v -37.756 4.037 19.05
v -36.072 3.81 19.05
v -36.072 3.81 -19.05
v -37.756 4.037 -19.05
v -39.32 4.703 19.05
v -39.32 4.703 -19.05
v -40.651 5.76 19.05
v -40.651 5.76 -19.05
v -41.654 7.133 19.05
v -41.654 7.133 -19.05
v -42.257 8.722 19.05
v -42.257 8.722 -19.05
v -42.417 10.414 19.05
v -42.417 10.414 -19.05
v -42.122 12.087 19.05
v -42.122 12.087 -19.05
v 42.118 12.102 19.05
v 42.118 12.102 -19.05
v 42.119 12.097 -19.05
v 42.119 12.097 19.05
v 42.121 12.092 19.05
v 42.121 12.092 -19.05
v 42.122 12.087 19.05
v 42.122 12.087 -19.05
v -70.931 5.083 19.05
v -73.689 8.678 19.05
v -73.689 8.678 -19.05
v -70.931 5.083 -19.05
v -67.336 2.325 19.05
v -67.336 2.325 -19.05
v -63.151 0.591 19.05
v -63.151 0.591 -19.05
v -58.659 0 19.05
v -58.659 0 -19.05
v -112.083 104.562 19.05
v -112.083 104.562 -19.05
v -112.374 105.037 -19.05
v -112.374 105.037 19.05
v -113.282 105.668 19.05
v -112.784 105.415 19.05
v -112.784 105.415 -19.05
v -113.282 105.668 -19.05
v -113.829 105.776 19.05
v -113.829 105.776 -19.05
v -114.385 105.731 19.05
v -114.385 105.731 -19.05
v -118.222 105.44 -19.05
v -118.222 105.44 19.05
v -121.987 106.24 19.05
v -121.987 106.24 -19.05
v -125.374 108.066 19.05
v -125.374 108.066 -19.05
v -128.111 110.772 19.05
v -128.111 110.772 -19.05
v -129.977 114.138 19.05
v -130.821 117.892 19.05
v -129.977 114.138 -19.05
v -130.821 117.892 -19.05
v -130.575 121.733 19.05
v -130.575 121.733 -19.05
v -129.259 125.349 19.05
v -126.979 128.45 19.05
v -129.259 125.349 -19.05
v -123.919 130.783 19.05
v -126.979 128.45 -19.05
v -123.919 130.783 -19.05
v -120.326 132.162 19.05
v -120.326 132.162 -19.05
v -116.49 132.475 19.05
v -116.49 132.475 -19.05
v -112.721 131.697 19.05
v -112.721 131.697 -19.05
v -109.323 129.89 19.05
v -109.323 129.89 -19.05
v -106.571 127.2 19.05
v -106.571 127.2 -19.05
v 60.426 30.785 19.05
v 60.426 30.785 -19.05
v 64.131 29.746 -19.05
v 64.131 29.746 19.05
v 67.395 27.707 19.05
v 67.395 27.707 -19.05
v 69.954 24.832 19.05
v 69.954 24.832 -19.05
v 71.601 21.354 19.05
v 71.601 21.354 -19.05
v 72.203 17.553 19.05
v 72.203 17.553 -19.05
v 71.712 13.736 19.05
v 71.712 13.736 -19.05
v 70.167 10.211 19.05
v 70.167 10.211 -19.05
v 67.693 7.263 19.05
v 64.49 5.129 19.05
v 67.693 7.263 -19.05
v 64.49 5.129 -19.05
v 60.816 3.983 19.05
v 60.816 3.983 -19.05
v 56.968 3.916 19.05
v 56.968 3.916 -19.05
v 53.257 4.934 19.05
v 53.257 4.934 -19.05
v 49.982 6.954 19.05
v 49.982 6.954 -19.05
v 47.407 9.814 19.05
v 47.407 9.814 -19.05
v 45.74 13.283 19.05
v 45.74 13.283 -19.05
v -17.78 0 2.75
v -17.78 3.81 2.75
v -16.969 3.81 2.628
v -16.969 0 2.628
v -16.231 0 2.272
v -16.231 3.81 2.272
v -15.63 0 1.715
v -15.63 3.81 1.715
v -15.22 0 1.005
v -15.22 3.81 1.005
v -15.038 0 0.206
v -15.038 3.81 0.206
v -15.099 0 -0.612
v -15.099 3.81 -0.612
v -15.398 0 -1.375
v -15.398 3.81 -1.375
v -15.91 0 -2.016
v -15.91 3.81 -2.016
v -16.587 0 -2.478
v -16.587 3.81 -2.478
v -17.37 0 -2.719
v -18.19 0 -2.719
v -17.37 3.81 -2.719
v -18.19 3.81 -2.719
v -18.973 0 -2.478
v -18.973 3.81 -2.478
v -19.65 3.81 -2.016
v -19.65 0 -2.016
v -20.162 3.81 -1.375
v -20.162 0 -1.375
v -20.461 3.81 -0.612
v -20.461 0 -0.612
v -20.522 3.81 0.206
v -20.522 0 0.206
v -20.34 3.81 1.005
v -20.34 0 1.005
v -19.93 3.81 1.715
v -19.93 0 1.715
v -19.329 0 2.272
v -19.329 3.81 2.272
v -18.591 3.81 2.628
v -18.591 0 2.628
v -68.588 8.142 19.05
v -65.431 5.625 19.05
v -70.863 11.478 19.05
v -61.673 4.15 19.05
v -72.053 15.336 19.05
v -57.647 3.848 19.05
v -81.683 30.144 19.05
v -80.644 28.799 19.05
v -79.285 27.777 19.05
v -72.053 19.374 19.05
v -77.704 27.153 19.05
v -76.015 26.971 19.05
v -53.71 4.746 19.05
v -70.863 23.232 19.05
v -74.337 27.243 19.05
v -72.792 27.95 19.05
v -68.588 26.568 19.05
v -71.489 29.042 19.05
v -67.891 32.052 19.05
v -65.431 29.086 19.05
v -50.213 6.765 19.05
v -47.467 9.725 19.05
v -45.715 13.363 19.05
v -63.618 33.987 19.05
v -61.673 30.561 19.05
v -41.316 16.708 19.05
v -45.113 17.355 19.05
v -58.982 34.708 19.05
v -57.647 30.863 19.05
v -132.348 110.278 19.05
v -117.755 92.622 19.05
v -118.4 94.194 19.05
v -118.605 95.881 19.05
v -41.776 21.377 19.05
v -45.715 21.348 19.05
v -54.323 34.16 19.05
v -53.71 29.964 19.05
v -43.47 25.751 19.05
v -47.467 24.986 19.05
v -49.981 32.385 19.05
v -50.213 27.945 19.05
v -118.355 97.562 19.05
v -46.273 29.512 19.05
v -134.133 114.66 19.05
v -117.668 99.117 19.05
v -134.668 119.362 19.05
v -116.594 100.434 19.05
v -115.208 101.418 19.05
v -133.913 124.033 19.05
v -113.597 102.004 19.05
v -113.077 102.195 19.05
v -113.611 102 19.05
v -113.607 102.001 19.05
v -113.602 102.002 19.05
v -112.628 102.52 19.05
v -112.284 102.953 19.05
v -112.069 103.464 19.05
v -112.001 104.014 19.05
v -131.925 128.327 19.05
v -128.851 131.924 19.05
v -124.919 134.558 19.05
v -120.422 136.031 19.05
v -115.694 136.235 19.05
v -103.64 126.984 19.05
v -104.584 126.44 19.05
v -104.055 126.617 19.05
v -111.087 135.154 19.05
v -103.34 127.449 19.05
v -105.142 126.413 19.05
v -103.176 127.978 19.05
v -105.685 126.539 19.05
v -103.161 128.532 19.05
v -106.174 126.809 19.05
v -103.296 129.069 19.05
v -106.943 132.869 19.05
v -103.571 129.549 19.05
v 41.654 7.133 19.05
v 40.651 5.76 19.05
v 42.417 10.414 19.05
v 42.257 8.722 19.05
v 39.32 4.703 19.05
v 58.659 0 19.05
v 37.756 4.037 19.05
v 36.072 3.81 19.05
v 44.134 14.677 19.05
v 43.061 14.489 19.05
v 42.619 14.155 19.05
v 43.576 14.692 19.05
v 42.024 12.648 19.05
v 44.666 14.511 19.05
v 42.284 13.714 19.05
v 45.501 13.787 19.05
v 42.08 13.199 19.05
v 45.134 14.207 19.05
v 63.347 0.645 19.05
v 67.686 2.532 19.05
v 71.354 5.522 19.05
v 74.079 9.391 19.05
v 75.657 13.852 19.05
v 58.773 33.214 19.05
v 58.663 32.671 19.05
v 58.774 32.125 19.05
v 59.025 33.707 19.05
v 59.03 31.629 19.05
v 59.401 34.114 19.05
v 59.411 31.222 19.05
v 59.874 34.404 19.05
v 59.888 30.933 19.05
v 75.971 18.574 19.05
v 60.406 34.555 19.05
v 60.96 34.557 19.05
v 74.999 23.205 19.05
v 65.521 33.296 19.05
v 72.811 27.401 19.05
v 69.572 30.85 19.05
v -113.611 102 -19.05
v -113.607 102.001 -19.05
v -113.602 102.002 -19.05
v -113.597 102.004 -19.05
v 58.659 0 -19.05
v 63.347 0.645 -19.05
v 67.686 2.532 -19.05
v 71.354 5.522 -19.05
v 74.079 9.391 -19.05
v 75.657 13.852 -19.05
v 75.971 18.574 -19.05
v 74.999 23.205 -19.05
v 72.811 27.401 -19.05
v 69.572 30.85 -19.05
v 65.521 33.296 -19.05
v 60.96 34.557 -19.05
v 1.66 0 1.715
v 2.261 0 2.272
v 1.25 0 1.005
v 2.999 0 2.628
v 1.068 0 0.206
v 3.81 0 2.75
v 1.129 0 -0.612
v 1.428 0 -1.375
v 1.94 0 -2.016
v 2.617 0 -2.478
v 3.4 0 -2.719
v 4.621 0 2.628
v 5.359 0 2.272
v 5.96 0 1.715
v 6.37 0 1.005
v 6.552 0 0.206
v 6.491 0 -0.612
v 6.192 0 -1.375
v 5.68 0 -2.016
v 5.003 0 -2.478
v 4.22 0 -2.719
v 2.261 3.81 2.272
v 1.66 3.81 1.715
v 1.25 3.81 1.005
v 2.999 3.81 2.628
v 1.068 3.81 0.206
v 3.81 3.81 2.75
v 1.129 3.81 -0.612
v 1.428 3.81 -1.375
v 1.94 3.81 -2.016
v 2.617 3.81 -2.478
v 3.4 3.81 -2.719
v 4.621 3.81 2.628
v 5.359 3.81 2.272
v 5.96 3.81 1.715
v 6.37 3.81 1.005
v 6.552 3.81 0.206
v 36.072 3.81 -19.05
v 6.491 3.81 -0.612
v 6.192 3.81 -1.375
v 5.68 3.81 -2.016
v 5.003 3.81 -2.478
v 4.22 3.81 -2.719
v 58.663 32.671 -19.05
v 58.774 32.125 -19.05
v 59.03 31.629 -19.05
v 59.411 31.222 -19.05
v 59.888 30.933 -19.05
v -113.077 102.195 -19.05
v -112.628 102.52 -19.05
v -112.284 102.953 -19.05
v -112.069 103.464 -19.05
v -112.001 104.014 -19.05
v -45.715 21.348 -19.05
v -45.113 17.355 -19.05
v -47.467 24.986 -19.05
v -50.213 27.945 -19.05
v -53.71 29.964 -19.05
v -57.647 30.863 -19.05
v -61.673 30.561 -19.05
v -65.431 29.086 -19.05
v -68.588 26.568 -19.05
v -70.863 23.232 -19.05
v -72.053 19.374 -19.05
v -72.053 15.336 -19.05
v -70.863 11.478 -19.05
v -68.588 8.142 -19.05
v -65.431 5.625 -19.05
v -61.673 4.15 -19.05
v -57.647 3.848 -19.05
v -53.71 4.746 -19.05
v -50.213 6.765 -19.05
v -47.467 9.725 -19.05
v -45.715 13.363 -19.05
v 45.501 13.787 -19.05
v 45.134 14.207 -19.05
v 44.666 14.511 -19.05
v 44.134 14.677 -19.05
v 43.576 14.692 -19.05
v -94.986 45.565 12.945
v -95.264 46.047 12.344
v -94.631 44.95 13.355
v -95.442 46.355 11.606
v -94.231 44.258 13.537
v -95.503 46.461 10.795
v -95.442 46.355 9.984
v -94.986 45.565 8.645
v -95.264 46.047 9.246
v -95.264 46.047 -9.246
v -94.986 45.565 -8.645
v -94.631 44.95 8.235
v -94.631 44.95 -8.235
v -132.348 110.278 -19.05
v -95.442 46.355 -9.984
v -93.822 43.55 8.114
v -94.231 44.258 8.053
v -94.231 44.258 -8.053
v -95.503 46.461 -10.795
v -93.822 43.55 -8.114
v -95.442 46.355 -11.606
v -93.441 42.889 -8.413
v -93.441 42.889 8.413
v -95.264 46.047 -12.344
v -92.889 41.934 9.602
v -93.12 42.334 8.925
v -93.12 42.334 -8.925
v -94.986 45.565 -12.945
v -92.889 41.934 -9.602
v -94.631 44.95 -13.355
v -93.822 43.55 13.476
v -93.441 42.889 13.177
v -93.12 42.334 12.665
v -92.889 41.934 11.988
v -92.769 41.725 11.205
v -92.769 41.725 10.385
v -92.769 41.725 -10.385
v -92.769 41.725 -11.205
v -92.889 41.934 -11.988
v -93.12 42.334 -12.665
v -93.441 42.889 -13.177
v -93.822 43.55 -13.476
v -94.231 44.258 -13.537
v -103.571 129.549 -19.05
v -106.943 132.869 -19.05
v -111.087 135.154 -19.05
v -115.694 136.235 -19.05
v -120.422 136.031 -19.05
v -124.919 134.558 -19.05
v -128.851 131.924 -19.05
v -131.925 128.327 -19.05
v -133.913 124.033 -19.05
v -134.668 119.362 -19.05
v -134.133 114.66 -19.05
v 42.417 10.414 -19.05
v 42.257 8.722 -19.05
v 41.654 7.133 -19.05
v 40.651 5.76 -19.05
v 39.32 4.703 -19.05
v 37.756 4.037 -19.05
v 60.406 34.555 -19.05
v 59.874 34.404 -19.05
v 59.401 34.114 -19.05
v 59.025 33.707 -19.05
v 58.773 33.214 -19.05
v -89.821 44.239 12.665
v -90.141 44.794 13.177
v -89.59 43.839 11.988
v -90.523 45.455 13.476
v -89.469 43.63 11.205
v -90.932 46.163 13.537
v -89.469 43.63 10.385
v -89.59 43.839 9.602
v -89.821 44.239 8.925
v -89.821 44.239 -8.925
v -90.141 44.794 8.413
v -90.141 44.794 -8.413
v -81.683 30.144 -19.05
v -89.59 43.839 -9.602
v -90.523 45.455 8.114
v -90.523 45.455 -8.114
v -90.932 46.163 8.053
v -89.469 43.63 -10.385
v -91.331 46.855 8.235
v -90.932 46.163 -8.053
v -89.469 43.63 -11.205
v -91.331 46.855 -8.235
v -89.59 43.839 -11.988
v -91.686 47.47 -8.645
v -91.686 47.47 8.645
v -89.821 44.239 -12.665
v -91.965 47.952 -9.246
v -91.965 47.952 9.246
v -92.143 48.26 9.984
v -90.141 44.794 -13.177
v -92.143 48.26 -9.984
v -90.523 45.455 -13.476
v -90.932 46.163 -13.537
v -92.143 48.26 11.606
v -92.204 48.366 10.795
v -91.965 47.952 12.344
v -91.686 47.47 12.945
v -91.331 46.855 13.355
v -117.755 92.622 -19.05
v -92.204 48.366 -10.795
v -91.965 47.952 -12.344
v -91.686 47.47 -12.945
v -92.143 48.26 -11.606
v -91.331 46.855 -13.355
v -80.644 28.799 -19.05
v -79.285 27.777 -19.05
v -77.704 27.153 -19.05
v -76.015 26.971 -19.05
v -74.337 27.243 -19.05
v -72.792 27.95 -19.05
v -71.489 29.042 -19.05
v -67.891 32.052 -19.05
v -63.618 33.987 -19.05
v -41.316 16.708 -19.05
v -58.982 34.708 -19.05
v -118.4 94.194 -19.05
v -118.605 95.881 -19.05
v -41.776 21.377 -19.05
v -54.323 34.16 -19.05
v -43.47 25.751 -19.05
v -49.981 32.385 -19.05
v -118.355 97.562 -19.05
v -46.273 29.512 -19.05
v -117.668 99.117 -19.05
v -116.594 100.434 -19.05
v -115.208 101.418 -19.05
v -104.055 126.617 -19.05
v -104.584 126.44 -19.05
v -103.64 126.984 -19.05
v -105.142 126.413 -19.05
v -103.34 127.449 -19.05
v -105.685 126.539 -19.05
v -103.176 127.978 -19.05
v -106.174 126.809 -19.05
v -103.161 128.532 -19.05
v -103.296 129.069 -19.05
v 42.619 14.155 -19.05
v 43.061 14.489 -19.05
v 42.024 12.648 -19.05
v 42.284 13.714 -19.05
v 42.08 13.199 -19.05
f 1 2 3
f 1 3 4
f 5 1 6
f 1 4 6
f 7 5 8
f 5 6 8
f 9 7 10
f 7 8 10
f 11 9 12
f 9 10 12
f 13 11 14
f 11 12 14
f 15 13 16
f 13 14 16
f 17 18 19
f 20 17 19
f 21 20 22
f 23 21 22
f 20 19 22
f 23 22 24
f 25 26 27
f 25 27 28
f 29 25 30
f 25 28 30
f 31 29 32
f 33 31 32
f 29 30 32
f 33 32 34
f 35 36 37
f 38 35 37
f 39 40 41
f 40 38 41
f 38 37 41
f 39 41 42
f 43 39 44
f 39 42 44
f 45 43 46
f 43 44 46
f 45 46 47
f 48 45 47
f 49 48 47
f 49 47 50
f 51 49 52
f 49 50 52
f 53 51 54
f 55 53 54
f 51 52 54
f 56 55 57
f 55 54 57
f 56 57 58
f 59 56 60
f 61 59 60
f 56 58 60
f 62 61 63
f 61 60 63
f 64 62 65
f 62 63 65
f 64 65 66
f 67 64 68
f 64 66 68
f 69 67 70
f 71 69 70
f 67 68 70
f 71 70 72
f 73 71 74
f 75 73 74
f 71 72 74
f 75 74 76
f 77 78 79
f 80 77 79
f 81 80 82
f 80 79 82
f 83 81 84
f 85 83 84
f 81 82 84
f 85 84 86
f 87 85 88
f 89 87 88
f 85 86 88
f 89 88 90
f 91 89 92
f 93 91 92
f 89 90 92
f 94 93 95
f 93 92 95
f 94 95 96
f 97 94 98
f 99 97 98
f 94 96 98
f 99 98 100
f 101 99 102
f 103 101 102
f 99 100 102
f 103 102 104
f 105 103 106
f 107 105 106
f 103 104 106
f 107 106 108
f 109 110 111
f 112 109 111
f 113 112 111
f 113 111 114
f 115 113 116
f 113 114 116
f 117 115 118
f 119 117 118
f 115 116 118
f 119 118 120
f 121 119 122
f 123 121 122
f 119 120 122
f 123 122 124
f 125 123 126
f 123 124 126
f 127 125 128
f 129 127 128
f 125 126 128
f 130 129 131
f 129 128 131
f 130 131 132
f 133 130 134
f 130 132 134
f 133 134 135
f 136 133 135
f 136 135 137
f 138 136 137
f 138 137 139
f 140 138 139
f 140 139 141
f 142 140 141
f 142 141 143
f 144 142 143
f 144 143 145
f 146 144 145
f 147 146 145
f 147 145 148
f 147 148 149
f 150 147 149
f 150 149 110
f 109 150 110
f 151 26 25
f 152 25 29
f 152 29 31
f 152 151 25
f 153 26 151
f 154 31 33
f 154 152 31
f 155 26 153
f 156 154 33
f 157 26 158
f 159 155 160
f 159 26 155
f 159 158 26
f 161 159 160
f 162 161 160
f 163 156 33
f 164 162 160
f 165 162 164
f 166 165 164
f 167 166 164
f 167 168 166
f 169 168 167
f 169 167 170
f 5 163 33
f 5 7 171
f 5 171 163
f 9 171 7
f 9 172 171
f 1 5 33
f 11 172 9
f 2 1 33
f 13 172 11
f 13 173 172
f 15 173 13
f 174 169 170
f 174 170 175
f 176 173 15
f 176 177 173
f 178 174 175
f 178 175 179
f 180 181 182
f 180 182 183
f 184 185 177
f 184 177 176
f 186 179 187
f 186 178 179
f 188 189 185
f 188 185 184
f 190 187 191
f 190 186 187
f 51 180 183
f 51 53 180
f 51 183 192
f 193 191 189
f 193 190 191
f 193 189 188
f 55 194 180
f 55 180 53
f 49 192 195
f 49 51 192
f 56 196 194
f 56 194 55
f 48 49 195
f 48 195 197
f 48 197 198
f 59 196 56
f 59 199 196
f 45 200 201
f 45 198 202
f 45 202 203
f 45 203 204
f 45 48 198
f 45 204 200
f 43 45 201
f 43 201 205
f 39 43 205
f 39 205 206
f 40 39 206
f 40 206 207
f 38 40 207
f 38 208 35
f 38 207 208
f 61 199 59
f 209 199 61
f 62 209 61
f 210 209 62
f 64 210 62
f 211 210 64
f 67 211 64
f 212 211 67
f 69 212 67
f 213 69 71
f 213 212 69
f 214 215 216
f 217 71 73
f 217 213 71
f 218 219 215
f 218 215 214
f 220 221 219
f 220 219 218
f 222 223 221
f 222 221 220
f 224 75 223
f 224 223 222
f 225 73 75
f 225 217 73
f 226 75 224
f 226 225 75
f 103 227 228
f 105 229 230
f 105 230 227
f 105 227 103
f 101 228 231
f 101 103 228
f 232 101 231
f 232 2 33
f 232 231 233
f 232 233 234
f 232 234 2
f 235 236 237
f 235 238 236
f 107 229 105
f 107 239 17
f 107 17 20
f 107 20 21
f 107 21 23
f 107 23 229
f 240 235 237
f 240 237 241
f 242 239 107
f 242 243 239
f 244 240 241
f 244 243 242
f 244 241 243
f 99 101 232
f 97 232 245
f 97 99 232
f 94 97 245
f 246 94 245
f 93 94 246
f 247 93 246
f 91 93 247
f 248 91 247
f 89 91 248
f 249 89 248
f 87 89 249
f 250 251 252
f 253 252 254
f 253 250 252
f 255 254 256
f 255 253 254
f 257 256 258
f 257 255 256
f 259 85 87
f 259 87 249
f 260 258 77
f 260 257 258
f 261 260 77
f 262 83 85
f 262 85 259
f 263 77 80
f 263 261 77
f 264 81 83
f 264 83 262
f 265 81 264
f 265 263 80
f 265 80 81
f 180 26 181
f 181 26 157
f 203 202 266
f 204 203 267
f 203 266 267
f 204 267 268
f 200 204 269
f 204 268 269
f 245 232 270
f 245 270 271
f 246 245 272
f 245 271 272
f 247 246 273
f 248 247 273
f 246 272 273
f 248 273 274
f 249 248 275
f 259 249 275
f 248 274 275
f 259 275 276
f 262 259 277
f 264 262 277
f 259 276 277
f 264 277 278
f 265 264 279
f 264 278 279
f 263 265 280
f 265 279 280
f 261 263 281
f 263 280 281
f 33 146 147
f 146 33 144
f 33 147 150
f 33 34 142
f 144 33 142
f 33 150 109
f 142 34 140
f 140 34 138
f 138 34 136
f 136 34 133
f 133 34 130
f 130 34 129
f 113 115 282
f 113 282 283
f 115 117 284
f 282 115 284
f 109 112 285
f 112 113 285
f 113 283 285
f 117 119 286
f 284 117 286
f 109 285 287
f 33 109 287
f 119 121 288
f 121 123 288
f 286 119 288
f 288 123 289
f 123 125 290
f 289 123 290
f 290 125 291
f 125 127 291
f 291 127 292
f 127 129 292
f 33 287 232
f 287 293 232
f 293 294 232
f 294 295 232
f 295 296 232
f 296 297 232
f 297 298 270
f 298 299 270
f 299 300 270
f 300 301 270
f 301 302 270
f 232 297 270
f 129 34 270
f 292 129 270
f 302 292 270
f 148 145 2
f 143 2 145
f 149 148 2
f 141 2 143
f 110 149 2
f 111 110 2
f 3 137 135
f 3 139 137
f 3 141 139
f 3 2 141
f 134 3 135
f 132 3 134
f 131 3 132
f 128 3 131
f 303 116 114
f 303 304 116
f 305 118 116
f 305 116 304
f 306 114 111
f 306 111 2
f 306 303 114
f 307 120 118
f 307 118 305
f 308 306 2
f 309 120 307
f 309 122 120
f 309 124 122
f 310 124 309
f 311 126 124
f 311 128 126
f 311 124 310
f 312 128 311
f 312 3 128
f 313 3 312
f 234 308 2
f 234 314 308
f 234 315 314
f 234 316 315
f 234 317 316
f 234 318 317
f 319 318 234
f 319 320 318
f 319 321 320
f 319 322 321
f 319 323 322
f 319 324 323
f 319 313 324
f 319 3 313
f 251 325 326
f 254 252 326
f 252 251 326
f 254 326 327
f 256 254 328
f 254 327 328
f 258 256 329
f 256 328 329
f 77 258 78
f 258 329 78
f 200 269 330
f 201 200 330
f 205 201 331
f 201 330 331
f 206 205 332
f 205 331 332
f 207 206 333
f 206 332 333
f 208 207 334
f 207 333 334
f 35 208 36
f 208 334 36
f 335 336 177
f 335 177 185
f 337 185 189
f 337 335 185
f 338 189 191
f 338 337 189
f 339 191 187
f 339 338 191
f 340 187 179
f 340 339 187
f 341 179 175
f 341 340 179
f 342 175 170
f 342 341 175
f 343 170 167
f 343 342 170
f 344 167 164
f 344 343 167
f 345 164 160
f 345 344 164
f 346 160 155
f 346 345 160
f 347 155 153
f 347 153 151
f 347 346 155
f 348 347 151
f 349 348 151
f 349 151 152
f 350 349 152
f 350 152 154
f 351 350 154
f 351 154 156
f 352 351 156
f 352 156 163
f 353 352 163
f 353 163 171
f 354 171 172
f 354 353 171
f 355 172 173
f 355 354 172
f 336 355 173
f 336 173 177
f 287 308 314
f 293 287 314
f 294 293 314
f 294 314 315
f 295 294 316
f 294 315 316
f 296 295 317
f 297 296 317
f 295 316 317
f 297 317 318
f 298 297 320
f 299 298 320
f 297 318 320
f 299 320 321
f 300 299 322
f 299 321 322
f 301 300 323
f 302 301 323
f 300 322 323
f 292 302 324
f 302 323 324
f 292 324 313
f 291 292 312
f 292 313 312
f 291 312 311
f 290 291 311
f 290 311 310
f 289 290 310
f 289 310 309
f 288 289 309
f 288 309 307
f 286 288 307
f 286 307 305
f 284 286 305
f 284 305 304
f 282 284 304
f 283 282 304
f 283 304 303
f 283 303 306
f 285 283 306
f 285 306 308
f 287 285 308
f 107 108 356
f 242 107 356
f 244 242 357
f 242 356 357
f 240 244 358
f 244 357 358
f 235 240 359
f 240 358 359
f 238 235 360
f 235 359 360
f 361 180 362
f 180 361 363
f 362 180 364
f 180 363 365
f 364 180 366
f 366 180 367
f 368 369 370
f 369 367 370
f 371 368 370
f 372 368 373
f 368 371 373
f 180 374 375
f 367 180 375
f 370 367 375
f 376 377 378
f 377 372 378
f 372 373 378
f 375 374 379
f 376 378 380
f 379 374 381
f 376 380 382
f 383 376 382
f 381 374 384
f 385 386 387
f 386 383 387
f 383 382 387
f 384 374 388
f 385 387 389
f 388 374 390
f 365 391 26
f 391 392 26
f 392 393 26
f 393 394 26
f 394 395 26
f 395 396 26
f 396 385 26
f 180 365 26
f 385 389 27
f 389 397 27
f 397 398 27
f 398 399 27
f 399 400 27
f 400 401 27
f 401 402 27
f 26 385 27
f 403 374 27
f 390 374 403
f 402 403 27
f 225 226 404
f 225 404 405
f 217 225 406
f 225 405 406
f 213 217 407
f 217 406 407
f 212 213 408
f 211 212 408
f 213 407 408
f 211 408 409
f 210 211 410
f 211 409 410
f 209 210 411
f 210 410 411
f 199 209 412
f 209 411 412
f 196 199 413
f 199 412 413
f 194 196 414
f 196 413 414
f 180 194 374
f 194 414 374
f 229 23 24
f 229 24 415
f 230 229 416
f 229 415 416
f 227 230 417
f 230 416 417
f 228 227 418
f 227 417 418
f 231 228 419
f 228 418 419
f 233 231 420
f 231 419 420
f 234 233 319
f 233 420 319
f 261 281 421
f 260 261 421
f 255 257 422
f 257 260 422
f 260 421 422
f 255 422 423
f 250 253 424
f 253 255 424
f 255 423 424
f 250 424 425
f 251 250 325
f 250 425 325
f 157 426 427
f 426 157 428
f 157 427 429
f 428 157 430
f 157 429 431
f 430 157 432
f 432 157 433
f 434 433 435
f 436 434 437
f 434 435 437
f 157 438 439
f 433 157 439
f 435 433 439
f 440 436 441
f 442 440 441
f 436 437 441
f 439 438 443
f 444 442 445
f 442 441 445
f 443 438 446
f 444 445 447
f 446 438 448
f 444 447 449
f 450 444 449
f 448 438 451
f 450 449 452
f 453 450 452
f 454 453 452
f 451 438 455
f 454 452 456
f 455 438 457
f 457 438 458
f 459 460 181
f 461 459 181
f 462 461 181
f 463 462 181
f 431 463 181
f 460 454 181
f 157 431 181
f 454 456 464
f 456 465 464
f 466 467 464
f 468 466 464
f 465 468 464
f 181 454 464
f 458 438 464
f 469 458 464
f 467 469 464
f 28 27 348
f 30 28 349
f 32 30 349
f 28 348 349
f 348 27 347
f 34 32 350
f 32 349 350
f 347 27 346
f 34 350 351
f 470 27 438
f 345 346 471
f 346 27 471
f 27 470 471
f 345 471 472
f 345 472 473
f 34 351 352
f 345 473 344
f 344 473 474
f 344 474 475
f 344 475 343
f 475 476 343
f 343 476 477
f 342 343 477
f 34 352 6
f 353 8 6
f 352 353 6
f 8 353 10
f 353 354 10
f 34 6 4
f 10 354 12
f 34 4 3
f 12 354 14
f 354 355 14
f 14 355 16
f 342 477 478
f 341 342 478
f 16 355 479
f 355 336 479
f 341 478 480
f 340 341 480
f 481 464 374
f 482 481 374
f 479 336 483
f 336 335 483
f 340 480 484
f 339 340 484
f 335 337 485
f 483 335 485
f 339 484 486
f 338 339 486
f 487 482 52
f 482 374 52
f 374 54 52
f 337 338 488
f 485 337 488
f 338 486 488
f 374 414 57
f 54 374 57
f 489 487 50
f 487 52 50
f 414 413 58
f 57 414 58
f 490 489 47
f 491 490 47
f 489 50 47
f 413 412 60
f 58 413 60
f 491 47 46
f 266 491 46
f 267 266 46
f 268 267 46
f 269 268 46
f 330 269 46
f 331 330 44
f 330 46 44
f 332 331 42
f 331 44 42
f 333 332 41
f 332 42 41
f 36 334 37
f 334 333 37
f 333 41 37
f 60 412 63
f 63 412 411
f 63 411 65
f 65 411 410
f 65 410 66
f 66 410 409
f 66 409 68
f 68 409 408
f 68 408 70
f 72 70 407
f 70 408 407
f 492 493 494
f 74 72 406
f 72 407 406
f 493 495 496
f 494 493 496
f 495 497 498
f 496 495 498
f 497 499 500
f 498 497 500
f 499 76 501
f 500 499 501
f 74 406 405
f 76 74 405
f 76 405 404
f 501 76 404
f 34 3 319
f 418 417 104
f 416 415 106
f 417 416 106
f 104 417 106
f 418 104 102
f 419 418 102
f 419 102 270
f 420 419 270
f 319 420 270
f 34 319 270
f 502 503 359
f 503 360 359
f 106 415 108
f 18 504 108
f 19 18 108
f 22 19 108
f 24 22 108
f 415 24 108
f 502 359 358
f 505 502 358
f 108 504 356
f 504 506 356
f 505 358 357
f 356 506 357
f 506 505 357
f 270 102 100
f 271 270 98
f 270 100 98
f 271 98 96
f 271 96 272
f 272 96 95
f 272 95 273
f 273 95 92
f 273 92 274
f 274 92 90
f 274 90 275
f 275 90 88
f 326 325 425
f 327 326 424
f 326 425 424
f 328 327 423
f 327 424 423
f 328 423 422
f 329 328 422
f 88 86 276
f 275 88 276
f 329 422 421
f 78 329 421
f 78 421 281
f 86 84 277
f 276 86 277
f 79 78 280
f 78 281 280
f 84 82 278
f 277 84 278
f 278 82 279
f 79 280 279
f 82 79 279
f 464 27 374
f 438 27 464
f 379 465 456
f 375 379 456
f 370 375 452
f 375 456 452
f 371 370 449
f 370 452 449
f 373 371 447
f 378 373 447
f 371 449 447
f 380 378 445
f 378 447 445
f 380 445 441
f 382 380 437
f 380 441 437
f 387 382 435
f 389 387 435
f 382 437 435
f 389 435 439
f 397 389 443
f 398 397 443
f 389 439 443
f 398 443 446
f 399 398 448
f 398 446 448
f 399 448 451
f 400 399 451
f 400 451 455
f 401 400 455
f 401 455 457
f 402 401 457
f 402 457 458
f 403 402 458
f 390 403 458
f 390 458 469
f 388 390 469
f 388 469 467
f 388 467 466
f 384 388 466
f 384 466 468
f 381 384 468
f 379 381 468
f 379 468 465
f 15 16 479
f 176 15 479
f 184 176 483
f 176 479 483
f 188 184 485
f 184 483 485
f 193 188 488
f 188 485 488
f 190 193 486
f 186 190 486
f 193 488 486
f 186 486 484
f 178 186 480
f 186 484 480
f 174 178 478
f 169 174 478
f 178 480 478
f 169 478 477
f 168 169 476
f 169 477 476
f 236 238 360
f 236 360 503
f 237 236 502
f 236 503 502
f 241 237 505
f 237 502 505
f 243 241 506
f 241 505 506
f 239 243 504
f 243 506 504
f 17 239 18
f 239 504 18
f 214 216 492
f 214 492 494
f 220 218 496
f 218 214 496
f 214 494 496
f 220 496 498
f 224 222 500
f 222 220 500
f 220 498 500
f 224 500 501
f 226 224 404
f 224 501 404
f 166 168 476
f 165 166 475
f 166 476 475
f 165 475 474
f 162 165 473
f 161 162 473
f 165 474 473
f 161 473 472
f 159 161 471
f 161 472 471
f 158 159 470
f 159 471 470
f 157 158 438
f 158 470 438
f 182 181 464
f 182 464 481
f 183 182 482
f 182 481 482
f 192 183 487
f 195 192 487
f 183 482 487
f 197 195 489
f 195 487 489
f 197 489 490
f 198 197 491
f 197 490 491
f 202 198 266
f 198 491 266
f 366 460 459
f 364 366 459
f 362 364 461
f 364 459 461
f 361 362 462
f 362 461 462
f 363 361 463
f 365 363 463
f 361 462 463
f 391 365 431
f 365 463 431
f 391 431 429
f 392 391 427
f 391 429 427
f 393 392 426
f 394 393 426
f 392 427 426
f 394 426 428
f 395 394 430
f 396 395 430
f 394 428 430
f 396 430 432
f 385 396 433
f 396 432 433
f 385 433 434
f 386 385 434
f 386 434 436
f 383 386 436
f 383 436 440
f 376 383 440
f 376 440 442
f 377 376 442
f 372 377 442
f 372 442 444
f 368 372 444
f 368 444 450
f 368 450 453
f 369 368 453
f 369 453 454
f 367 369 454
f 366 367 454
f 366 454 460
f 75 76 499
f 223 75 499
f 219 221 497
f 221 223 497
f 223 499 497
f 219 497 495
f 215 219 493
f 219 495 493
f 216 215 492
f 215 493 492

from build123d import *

# Parameters (mm, degrees)
SKETCH3_W               = 114.3
SKETCH3_H               = 38.1
BOSS_EXTRUDE1_DEPTH     = 3.81
BOSS_EXTRUDE2_START     = -19.05
BOSS_EXTRUDE2_OUTLINE_R = 13.5453125
BOSS_EXTRUDE2_DEPTH     = 38.1
FILLET1_R               = 2.032
SKETCH5_R               = 2.749999961
CUT_EXTRUDE4_DEPTH      = 12.7
SKETCH6_R               = 2.749999961
CUT_EXTRUDE5_DEPTH      = 7.62


# Read off the part's stored shape, not the designer's step: Boss-Extrude2
with BuildPart() as part:
    # Sketch3 → Boss-Extrude1 (new body)
    with BuildSketch(Plane(origin=(0, 0, 0), x_dir=(1, 0, 0), z_dir=(0, 1, 0))):
        Rectangle(SKETCH3_W, SKETCH3_H)
    extrude(amount=BOSS_EXTRUDE1_DEPTH)

    # Boss-Extrude2 outline → Boss-Extrude2 (add)
    # profile 1 of 2: a face of its own
    with BuildSketch(Plane.XY.offset(BOSS_EXTRUDE2_START)):
        with BuildLine():
            ThreePointArc((58.658787305, 0), (76.014099805, 17.3553125), (58.658787305, 34.710625))
            Line((58.658787305, 34.710625), (58.658787305, 30.900625))
            ThreePointArc((58.658787305, 30.900625), (69.035098676, 8.648553456), (45.319258538, 15.003193668))
            Line((45.319258538, 15.003193668), (41.567140999, 14.341594112))
            ThreePointArc((41.567140999, 14.341594112), (41.806974837, 13.2052175), (42.122274879, 12.087425946))
            ThreePointArc((42.122274879, 12.087425946), (41.198342199, 6.412778013), (36.071859255, 3.81))
            Line((36.071859255, 3.81), (57.15, 3.81))
            Line((57.15, 3.81), (57.15, 0))
            Line((57.15, 0), (58.658787305, 0))
        make_face()
    # profile 2 of 2: a face of its own
    with BuildSketch(Plane.XY.offset(BOSS_EXTRUDE2_START)):
        with BuildLine():
            Line((-58.658787305, 0), (-57.15, 0))
            Line((-57.15, 0), (-57.15, 3.81))
            Line((-57.15, 3.81), (-36.071859255, 3.81))
            ThreePointArc((-36.071859255, 3.81), (-41.198342199, 6.412778013), (-42.122274879, 12.087425946))
            ThreePointArc((-42.122274879, 12.087425946), (-49.981131055, 32.385454016), (-71.489167098, 29.042409074))
            ThreePointArc((-71.489167098, 29.042409074), (-76.865522705, 27.00523428), (-81.682836057, 30.143509735))
            Line((-81.682836057, 30.143509735), (-117.754695312, 92.621802688))
            ThreePointArc((-117.754695312, 92.621802688), (-118.063864905, 98.362856156), (-113.611441977, 102.000329294))
            ThreePointArc((-113.611441977, 102.000329294), (-112.485756074, 102.286167225), (-111.381708141, 102.646653335))
            Line((-111.381708141, 102.646653335), (-112.684804887, 106.22688222))
            ThreePointArc((-112.684804887, 106.22688222), (-130.046004812, 123.588082145), (-105.586989883, 125.727968673))
            Line((-105.586989883, 125.727968673), (-102.287433094, 127.632968673))
            ThreePointArc((-102.287433094, 127.632968673), (-125.99523086, 133.985453938), (-132.347716126, 110.277656173))
            Line((-132.347716126, 110.277656173), (-73.688928821, 8.67765625))
            ThreePointArc((-73.688928821, 8.67765625), (-67.336443555, 2.325170984), (-58.658787305, 0))
        make_face()
        with Locations((-58.658787305, 17.3553125)):
            Circle(BOSS_EXTRUDE2_OUTLINE_R, mode=Mode.SUBTRACT)
    extrude(amount=BOSS_EXTRUDE2_DEPTH)

    # Fillet1
    # the kernel refuses this fillet: 2.032 mm, written as the material it takes off along each edge
    with BuildSketch(Plane(origin=(58.658787305, 34.710625, -24.816396244), x_dir=(0.9977896842762429, -0.06645107938864002, 0), z_dir=(0, 0, 1))) as fillet1_piece_1:
        with BuildLine():
            CenterArc((2.171529904, -2.027508638), FILLET1_R, 86.189825964, 97.620348072)
            Line((0.144021266, -2.162537232), (0, 0))
            ThreePointArc((0, 0), (1.153279249, 0.03836072), (2.306558498, 0))
        make_face()
    extrude(amount=49.632792488, mode=Mode.SUBTRACT)
    with BuildSketch(Plane(origin=(58.658787305, 30.900625, -23.797245223), x_dir=(0, 1, 0), z_dir=(0, 0, 1)), Plane(origin=(-112.684804887, 106.22688222, -23.797245223), x_dir=(0.342020143325642, -0.9396926207859182, 0), z_dir=(0, 0, 1))) as fillet1_piece_2:
        with BuildLine():
            CenterArc((1.898898089, -2.032), FILLET1_R, 90, 82.504627273)
            ThreePointArc((-0.115739283, -1.766933481), (-0.028965791, -0.885360027), (0, 0))
            Line((0, 0), (1.898898089, 0))
        make_face()
    extrude(amount=47.594490446, mode=Mode.SUBTRACT)
    with BuildSketch(Plane(origin=(45.319258538, 15.003193668, -23.797245222), x_dir=(0.23764666879808158, -0.9713516669101747, 0), z_dir=(0, 0, 1))) as fillet1_piece_3:
        with BuildLine():
            CenterArc((1.903537334, -2.027654697), FILLET1_R, 93.747686362, 82.50462726)
            Line((-0.124117363, -1.894837416), (0, 0))
            ThreePointArc((0, 0), (0.885360027, -0.028965791), (1.770720053, 0))
        make_face()
    extrude(amount=47.594490443, mode=Mode.SUBTRACT)
    with BuildSketch(Plane(origin=(41.567140999, 14.341594112, -24.816396246), x_dir=(0.984807753053284, 0.17364817743397684, 0), z_dir=(0, 0, 1))) as fillet1_piece_4:
        with BuildLine():
            CenterArc((2.167327711, -2.032), FILLET1_R, 90, 97.620348093)
            ThreePointArc((0.153273303, -2.301460276), (0.038360721, -1.153279249), (0, 0))
            Line((0, 0), (2.167327711, 0))
        make_face()
    extrude(amount=49.632792491, mode=Mode.SUBTRACT)
    with BuildSketch(Plane(origin=(-102.287433094, 127.632968673, -24.816396244), x_dir=(-0.8660254038225857, -0.4999999999339274, 0), z_dir=(0, 0, 1))) as fillet1_piece_5:
        with BuildLine():
            CenterArc((2.167327711, -2.032), FILLET1_R, 90, 97.62034808)
            ThreePointArc((0.153273302, -2.301460275), (0.03836072, -1.153279249), (0, 0))
            Line((0, 0), (2.167327711, 0))
        make_face()
    extrude(amount=49.632792489, mode=Mode.SUBTRACT)
    with BuildSketch(Plane(origin=(-105.586989883, 125.727968673, -23.797245222), x_dir=(-0.5555366573888737, 0.8314920458412077, 0), z_dir=(0, 0, 1))) as fillet1_piece_6:
        with BuildLine():
            CenterArc((1.903537334, -2.027654697), FILLET1_R, 93.747686363, 82.504627266)
            Line((-0.124117363, -1.894837416), (0, 0))
            ThreePointArc((0, 0), (0.885360027, -0.028965791), (1.770720053, 0))
        make_face()
    extrude(amount=47.594490445, mode=Mode.SUBTRACT)
    with BuildSketch(Plane(origin=(-111.381708141, 102.646653335, -24.816396244), x_dir=(-0.960343211064482, -0.2788205820278691, 0), z_dir=(0, 0, 1))) as fillet1_piece_7:
        with BuildLine():
            CenterArc((2.171529904, -2.027508638), FILLET1_R, 86.189825951, 97.620348077)
            Line((0.144021265, -2.162537231), (0, 0))
            ThreePointArc((0, 0), (1.153279249, 0.03836072), (2.306558498, 0))
        make_face()
    extrude(amount=49.632792488, mode=Mode.SUBTRACT)

    # Sketch5 → Cut-Extrude4 (cut)
    with BuildSketch(Plane(origin=(0, 3.81, 0), x_dir=(1, 0, 0), z_dir=(0, 1, 0))):
        with Locations(Location((-17.78, 0, 0), (0, 0, 270))):
            Circle(SKETCH5_R)
        with Locations(Location((3.81, 0, 0), (0, 0, 270))):
            Circle(SKETCH5_R)
    extrude(amount=-CUT_EXTRUDE4_DEPTH, mode=Mode.SUBTRACT)

    # Sketch6 → Cut-Extrude5 (cut)
    with BuildSketch(Plane(origin=(-48.209604448, -27.833828106, 0), x_dir=(0, 0, -1), z_dir=(0.8660254037844433, 0.4999999999999923, 0))):
        with Locations(Location((-10.795, 85.238322473, 0), (0, 0, 90))):
            Circle(SKETCH6_R)
        with Locations(Location((10.795, 85.238322473, 0), (0, 0, 90))):
            Circle(SKETCH6_R)
    extrude(amount=-CUT_EXTRUDE5_DEPTH, mode=Mode.SUBTRACT)


solid = part.part
